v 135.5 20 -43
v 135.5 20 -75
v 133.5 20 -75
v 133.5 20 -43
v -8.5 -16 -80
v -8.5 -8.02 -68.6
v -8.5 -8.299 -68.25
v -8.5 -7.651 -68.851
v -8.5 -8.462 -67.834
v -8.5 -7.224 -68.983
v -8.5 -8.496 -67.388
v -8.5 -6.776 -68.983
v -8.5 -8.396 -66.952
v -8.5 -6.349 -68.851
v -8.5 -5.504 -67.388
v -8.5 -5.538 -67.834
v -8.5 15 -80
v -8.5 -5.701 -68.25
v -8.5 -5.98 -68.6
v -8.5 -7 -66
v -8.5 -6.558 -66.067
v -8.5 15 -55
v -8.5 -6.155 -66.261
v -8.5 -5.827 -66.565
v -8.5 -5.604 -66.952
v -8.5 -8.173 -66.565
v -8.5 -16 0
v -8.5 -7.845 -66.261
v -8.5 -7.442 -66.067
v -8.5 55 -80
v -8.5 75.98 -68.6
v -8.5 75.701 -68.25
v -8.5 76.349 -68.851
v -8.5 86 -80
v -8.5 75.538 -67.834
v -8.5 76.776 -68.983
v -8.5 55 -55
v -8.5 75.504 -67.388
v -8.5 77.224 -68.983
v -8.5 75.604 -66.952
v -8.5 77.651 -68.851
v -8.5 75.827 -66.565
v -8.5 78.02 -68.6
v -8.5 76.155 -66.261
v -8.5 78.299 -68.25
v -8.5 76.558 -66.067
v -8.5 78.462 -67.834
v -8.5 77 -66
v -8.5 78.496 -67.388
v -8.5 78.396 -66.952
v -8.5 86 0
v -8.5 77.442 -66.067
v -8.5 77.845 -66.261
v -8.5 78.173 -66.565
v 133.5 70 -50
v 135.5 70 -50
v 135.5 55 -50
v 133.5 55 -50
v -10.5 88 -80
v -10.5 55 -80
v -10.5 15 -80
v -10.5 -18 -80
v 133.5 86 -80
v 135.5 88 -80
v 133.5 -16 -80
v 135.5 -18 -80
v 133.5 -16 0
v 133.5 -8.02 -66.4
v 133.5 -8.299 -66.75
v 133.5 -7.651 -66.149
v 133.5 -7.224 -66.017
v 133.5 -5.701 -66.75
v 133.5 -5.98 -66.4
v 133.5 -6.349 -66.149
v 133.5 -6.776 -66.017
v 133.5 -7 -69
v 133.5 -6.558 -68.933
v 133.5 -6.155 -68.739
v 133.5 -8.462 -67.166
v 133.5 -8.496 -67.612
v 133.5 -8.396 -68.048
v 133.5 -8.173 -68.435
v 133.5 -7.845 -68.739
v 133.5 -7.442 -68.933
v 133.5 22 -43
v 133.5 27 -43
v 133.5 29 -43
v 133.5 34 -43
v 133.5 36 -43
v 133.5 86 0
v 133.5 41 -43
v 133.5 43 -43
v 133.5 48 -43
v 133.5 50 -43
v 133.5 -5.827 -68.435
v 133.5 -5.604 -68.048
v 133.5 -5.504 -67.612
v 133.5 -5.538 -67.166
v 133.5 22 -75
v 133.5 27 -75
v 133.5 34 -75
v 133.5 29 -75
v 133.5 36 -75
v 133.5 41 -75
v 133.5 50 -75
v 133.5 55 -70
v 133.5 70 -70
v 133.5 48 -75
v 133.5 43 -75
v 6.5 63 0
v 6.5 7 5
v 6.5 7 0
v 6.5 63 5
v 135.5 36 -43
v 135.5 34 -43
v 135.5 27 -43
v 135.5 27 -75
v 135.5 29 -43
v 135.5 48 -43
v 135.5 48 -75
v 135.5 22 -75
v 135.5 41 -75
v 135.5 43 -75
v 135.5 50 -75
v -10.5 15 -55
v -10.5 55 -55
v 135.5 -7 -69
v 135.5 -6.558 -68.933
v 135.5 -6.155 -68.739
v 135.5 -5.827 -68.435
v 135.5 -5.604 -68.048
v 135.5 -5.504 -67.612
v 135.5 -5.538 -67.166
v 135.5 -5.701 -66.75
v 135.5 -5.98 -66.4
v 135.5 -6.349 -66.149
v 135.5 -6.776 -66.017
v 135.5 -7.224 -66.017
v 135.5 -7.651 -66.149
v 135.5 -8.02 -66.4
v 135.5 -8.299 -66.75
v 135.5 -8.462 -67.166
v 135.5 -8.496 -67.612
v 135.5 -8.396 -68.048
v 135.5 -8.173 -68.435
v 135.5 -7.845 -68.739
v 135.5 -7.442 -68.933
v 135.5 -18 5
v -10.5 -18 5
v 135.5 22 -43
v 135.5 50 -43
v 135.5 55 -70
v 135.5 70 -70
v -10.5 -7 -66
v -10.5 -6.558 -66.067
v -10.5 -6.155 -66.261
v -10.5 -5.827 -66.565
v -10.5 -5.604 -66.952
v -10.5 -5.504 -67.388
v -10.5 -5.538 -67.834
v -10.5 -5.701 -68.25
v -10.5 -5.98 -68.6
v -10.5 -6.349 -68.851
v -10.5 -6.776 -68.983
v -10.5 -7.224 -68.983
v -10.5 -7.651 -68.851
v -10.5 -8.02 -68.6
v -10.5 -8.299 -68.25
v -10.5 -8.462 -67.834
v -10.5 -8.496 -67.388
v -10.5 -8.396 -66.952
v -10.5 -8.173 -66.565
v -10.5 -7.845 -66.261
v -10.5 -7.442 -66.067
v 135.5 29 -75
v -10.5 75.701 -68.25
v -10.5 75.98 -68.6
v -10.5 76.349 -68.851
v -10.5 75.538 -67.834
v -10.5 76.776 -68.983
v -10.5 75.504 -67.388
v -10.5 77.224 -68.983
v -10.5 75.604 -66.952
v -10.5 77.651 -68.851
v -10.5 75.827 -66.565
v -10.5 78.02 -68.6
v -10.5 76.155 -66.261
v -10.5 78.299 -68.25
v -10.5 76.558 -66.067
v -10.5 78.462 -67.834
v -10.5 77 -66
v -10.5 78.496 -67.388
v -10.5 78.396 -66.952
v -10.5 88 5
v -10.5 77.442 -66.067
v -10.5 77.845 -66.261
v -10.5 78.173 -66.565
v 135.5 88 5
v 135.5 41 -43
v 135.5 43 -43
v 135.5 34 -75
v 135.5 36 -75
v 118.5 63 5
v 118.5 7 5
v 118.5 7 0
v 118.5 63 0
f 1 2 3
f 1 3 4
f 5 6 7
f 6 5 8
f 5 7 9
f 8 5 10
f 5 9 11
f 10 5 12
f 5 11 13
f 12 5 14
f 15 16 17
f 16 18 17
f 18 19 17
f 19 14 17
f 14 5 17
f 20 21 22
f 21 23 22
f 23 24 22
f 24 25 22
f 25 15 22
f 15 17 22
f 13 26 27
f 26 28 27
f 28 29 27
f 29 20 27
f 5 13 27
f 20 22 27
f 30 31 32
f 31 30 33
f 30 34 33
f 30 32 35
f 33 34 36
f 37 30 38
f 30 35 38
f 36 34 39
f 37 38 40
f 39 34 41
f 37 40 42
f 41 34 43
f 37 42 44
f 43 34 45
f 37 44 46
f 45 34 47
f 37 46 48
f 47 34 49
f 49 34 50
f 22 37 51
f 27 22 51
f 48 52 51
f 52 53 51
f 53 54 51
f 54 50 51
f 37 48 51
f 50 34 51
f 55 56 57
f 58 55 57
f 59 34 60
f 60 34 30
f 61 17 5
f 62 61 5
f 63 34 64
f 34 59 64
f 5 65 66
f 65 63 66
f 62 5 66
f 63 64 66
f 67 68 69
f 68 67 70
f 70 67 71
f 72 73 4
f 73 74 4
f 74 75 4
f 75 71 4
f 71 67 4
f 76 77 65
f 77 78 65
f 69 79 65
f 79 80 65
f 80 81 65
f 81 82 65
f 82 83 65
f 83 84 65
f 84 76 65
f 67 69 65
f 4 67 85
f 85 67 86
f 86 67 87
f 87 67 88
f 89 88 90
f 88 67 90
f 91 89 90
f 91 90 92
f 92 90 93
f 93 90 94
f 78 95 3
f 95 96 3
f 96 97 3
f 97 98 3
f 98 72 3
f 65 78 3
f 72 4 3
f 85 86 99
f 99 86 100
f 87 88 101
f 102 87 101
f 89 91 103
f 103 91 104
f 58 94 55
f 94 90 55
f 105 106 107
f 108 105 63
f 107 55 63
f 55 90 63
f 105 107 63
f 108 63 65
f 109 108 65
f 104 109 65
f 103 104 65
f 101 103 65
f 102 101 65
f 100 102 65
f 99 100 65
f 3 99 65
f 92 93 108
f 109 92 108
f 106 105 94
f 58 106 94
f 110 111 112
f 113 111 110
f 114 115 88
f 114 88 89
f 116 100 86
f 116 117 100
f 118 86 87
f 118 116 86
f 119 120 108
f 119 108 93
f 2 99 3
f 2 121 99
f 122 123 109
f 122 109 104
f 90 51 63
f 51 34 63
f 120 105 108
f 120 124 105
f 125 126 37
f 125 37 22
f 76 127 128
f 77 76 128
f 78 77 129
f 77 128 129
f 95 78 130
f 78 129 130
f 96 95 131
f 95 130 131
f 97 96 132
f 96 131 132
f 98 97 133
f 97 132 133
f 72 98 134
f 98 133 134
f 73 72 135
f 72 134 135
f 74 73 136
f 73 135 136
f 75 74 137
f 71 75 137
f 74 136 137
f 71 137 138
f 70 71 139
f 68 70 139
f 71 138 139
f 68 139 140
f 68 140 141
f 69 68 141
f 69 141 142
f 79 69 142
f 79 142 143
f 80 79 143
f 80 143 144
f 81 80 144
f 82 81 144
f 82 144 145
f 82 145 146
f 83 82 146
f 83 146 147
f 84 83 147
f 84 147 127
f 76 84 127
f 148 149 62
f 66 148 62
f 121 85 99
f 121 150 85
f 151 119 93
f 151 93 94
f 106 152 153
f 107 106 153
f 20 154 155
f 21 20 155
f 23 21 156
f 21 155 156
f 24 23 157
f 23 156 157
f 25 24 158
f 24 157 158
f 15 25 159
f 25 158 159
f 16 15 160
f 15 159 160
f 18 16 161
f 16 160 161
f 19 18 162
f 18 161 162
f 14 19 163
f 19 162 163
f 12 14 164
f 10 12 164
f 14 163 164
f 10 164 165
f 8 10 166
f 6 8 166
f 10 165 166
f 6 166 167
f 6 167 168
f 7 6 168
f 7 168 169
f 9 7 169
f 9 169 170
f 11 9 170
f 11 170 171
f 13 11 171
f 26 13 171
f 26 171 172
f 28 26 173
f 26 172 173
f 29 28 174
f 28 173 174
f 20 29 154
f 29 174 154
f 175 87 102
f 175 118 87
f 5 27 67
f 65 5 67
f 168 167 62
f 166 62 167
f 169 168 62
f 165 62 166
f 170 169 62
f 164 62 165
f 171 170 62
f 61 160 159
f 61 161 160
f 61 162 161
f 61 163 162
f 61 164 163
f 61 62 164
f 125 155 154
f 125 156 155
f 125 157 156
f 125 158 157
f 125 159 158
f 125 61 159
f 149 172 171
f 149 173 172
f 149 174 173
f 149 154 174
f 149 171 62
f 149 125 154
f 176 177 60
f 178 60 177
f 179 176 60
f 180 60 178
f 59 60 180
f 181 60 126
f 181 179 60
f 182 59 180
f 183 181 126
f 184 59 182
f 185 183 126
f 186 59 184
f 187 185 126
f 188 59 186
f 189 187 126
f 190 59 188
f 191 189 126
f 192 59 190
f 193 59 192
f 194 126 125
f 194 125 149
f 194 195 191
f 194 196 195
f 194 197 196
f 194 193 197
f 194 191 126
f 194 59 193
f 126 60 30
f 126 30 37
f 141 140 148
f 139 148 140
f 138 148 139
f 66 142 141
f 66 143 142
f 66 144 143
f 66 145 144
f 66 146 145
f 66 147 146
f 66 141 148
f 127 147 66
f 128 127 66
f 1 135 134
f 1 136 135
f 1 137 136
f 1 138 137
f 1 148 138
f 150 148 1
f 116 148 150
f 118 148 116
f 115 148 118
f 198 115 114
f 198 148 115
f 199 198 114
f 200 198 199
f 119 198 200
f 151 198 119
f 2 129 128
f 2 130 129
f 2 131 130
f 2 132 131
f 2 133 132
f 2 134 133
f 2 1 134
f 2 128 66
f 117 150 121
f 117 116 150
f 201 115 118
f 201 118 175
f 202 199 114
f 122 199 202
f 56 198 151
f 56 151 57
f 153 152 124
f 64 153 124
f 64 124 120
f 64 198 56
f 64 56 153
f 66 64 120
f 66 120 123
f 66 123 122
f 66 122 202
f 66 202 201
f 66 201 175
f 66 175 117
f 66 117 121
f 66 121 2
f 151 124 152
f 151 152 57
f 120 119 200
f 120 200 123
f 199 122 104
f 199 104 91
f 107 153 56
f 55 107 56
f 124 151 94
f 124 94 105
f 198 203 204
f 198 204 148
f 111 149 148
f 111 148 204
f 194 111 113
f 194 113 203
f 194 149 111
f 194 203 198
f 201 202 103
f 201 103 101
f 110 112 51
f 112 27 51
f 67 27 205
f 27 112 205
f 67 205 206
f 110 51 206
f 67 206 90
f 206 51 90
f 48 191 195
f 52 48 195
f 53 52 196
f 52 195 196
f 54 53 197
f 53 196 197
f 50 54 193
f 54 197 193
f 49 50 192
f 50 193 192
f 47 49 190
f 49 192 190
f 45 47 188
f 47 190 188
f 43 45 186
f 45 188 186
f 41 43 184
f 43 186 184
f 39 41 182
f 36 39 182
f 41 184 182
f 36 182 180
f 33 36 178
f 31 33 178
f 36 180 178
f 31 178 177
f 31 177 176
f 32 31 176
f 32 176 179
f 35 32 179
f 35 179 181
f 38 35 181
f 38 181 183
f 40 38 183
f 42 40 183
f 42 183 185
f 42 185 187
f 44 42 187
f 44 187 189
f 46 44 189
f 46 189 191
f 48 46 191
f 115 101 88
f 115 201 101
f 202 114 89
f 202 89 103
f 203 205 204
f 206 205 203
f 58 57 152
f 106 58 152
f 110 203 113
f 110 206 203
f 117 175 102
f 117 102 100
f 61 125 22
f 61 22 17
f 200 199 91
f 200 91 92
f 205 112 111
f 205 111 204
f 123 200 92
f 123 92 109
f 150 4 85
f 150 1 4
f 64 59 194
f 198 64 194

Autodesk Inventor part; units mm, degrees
ref_plane "YZ Plane" through (0, 0, 0) normal (1, 0, 0) x (0, 1, 0)
ref_plane "XZ Plane" through (0, 0, 0) normal (0, 1, 0) x (-1, 0, 0)
ref_plane "XY Plane" through (0, 0, 0) normal (0, 0, 1) x (1, 0, 0)
sketch "Sketch1" plane through (0, 0, 0) normal (0, 0, 1) x (1, 0, 0)
  line L0 (0, 0) -> (0, 70) construction
  circle A0 centre (0, 0) radius 2.5
  circle A1 centre (0, 70) radius 2.5
  line L1 (0, 0) -> (125, 0) construction
  circle A2 centre (125, 0) radius 2.5
  circle A3 centre (125, 70) radius 2.5
  line L2 (-8.5, -16) -> (133.5, -16)
  line L3 (133.5, -16) -> (133.5, 86)
  line L4 (133.5, 86) -> (-8.5, 86)
  line L5 (-8.5, 86) -> (-8.5, -16)
  point P0 (62.5, 0)
  point P1 (62.5, -16)
  point P2 (0, 35)
  point P3 (-8.5, 35)
  dimension "d0" = 70
  dimension "d1" = 5
  dimension "d2" = 5
  dimension "d3" = 5
  dimension "d4" = 5
  dimension "d5" = 125
  dimension "d6" = 142
  dimension "d7" = 102
extrude "Extrusion1" add sketch "Sketch1" along normal blind 5
sketch "Sketch2" plane through (0, 0, 5) normal (0, 0, 1) x (1, 0, 0)
  line L0 (6.5, 60) -> (118.5, 60)
  line L1 (118.5, 60) -> (118.5, 10)
  line L2 (118.5, 10) -> (6.5, 10)
  line L3 (6.5, 10) -> (6.5, 60)
  line L4 (-8.5, 86) -> (-8.5, -16) projected
  line L5 (133.5, 86) -> (-8.5, 86) projected
  point P0 (0, 0)
  point P1 (62.5, 60)
  point P2 (62.5, 86)
  point P3 (6.5, 35)
  point P4 (-8.5, 35)
  dimension "d10" = 15
  dimension "d11" = 50
extrude "Extrusion2" cut sketch "Sketch2" against normal through all
sketch "Sketch3" plane through (-8.5, 86, 0) normal (0, 1, 0) x (1, 0, 0)
  line L0 (142, 0) -> (142, -5) projected
  line L1 (142, -5) -> (0, -5)
  line L2 (0, -5) -> (0, 80)
  line L3 (0, 80) -> (142, 80)
  line L4 (142, 80) -> (142, -5)
  point P0 (8.5, 0)
  dimension "d17" = 85
extrude "Extrusion3" add sketch "Sketch3" along normal blind 2
sketch "Sketch4" plane through (-8.5, -16, 0) normal (0, -1, 0) x (1, 0, 0)
  line L0 (142, 0) -> (0, 0) projected
  line L1 (0, 0) -> (0, -80) projected
  line L2 (0, -80) -> (142, -80) projected
  line L3 (142, -80) -> (142, 0) projected
  line L4 (0, 0) -> (142, 0) projected
  line L5 (142, 0) -> (142, 5) projected
  line L6 (0, 5) -> (142, 5) projected
  line L7 (0, 0) -> (0, 5) projected
  point P0 (8.5, 0)
extrude "Extrusion4" add sketch "Sketch4" along normal blind 2
sketch "Sketch5" plane through (-8.5, 86, -80) normal (-1, 0, 0) x (0, 0, 1)
  line L0 (85, -104) -> (85, 2) projected
  line L1 (0, -102) -> (0, -104) projected
  line L2 (85, 2) -> (0, 2)
  line L3 (0, 2) -> (0, -104)
  line L4 (0, -104) -> (85, -104)
  line L5 (85, -104) -> (85, 2)
  point P0 (80, -86)
extrude "Extrusion5" add sketch "Sketch5" along normal blind 2
sketch "Sketch6" plane through (133.5, 86, 0) normal (1, 0, 0) x (0, 0, -1)
  line L0 (-5, -104) -> (-5, 2) projected
  line L1 (-5, -104) -> (80, -104)
  line L2 (80, -104) -> (80, 2)
  line L3 (80, 2) -> (-5, 2)
  line L4 (-5, 2) -> (-5, -104)
  point P0 (0, -86)
extrude "Extrusion6" add sketch "Sketch6" along normal blind 2
sketch "Sketch7" plane through (0, 0, 5) normal (0, 0, 1) x (1, 0, 0)
  line L0 (118.5, 10) -> (6.5, 10) construction
  line L1 (6.5, 60) -> (118.5, 60) construction
  line L2 (6.5, 10) -> (6.5, 60) construction
  line L3 (118.5, 60) -> (118.5, 10) construction
  line L4 (6.5, 60) -> (61.5, 60)
  line L5 (61.5, 60) -> (61.5, 50)
  line L6 (61.5, 50) -> (6.5, 50)
  line L7 (6.5, 50) -> (6.5, 60)
  line L8 (118.5, 10) -> (63.5, 10)
  line L9 (63.5, 10) -> (63.5, 20)
  line L10 (63.5, 20) -> (118.5, 20)
  line L11 (118.5, 20) -> (118.5, 10)
  line L12 (118.5, 10) -> (6.5, 10) projected
  line L13 (6.5, 60) -> (118.5, 60) projected
  line L14 (6.5, 10) -> (6.5, 60) projected
  point P0 (0, 0)
  point P1 (62.5, 10)
  point P2 (62.5, 60)
  point P3 (6.5, 35)
  dimension "d26" = 55
  dimension "d27" = 10
  dimension "d28" = 55
  dimension "d29" = 10
extrude "Extrusion7" add sketch "Sketch7" against normal blind 5
chamfer "Chamfer2" distance 3 angle 45 4 edges at (35, 10, 0) (90, 60, 0) (91, 20, 5) (34, 50, 5)
sketch "Sketch8" plane through (135.5, 86, 0) normal (1, 0, 0) x (0, 0, -1)
  line L0 (80, -104) -> (80, 2) projected
  line L1 (80, -102) -> (80, 0) projected
  line L2 (80, -51) -> (93.9386, -51)
  line L3 (80, -78.0836) -> (55, -78.0836)
  line L4 (55, -78.0836) -> (55, -58.0836)
  line L5 (55, -58.0836) -> (80, -58.0836)
  line L6 (80, -58.0836) -> (80, -78.0836)
  point P0 (0, -86)
  dimension "d36" = 20
  dimension "d37" = 25
  dimension "d40" = 7.0836
extrude "Extrusion8" cut sketch "Sketch8" against normal blind 10
sketch "Sketch9" plane through (-10.5, 86, -80) normal (-1, 0, 0) x (0, 0, 1)
  line L0 (0, -58.0836) -> (0, 0) projected
  line L1 (0, -31) -> (25, -31)
  line L2 (25, -31) -> (25, -71)
  line L3 (25, -71) -> (0, -71)
  line L4 (0, -71) -> (0, -31)
  line L5 (0, 2) -> (0, -104) projected
  line L6 (0, -71) -> (25, -71)
  line L7 (25, -71) -> (25, -31)
  line L8 (25, -31) -> (0, -31)
  line L9 (0, -31) -> (0, -71)
  point P0 (80, -86)
  point P1 (0, -51)
  dimension "d41" = 40
  dimension "d42" = 25
extrude "Extrusion9" cut sketch "Sketch9" against normal blind 10
sketch "Sketch10" plane through (-10.5, 86, -80) normal (-1, 0, 0) x (0, 0, 1)
  circle A0 centre (12.5, -93) radius 1.5
  circle A1 centre (12.5, -9) radius 1.5
  line L0 (12.5, -93) -> (12.5, -9) construction
  line L1 (85, -104) -> (85, 2) projected
  line L2 (25, -71) -> (0, -71) projected
  point P0 (80, -86)
  point P1 (85, -51)
  point P2 (12.5, -51)
  point P3 (12.5, -71)
  point P4 (12.5, -71)
  dimension "d45" = 3
  dimension "d46" = 3
  dimension "d47" = 84
extrude "Extrusion10" cut sketch "Sketch10" against normal blind 10
sketch "Sketch11" plane through (0, 0, 5) normal (0, 0, 1) x (1, 0, 0)
  circle A0 centre (0, 0) radius 2.5 projected
  circle A1 centre (0, 70) radius 2.5 projected
  circle A2 centre (125, 0) radius 2.5 projected
  circle A3 centre (125, 70) radius 2.5 projected
extrude "Extrusion11" add sketch "Sketch11" against normal blind 5
sketch "Sketch12" plane through (0, 0, 5) normal (0, 0, 1) x (1, 0, 0)
  line L0 (118.5, 20) -> (118.5, 63) projected
  line L1 (6.5, 7) -> (118.5, 7)
  line L2 (118.5, 7) -> (118.5, 63)
  line L3 (118.5, 63) -> (6.5, 63)
  line L4 (6.5, 63) -> (6.5, 7)
  point P0 (0, 0)
extrude "Extrusion12" cut sketch "Sketch12" along normal through all both and the other way through all
sketch "Sketch13" plane through (135.5, 86, 0) normal (1, 0, 0) x (0, 0, -1)
  line L0 (55, -58.0836) -> (80, -58.0836) projected
  line L1 (55, -78.0836) -> (55, -58.0836) projected
  line L2 (80, -78.0836) -> (55, -78.0836) projected
  line L3 (80, -58.0836) -> (80, -78.0836)
  line L4 (80, -71) -> (80, -102) projected
  point P0 (0, -86)
extrude "Extrusion13" add sketch "Sketch13" against normal blind 2
sketch "Sketch15" plane through (135.5, 86, 0) normal (1, 0, 0) x (0, 0, -1)
  line L0 (50, -31) -> (70, -31)
  line L1 (70, -31) -> (70, -16)
  line L2 (70, -16) -> (50, -16)
  line L3 (50, -16) -> (50, -31)
  line L4 (80, -104) -> (80, 2) projected
  line L5 (80, 2) -> (-5, 2) projected
  point P0 (0, -86)
  dimension "d64" = 20
  dimension "d65" = 15
  dimension "d66" = 10
  dimension "d67" = 18
extrude "Extrusion15" cut sketch "Sketch15" against normal blind 10
sketch "Sketch16" plane through (135.5, 86, 0) normal (1, 0, 0) x (0, 0, -1)
  line L0 (70, -31) -> (50, -31) construction
  line L1 (50, -16) -> (70, -16) construction
  line L2 (50, -31) -> (50, -16) construction
  line L3 (70, -16) -> (70, -31) construction
  line L4 (70, -31) -> (70, -16) construction
  line L5 (70, -31) -> (38, -31) construction
  line L6 (38, -31) -> (38, -71) construction
  line L7 (38, -71) -> (80, -71) construction
  line L8 (80, -71) -> (80, -31) construction
  line L9 (43, -66) -> (43, -36) construction
  line L10 (43, -36) -> (75, -36) construction
  line L11 (75, -36) -> (75, -66) construction
  line L12 (75, -66) -> (43, -66) construction
  line L13 (43, -36) -> (75, -36)
  line L14 (75, -36) -> (75, -38)
  line L15 (75, -38) -> (43, -38)
  line L16 (43, -38) -> (43, -36)
  line L17 (75, -66) -> (43, -66)
  line L18 (43, -66) -> (43, -64)
  line L19 (43, -64) -> (75, -64)
  line L20 (75, -64) -> (75, -66)
  line L21 (75, -45) -> (43, -45)
  line L22 (43, -43) -> (75, -43) construction
  line L23 (43, -43) -> (75, -43)
  line L24 (75, -43) -> (75, -45)
  line L25 (43, -45) -> (43, -43)
  line L26 (75, -43) -> (75, -73) construction
  line L27 (75, -52) -> (43, -52)
  line L28 (43, -50) -> (75, -50) construction
  line L29 (43, -50) -> (75, -50)
  line L30 (75, -50) -> (75, -52)
  line L31 (43, -52) -> (43, -50)
  line L32 (75, -50) -> (75, -80) construction
  line L33 (75, -59) -> (43, -59)
  line L34 (43, -57) -> (75, -57) construction
  line L35 (43, -57) -> (75, -57)
  line L36 (75, -57) -> (75, -59)
  line L37 (43, -59) -> (43, -57)
  line L38 (75, -57) -> (75, -87) construction
  line L39 (75, -66) -> (43, -66)
  line L40 (43, -64) -> (75, -64) construction
  line L41 (43, -64) -> (75, -64)
  line L42 (75, -64) -> (75, -66)
  line L43 (43, -66) -> (43, -64)
  line L44 (75, -64) -> (75, -94) construction
  line L45 (80, -104) -> (80, 2) projected
  point P0 (0, -86)
  dimension "d70" = 42
  dimension "d71" = 40
  dimension "d72" = 5
  dimension "d73" = 2
  dimension "d74" = 2
  dimension "d77" = 7
extrude "Extrusion16" cut sketch "Sketch16" against normal blind 10
sketch "Sketch17" plane through (135.5, 86, 0) normal (1, 0, 0) x (0, 0, -1)
  circle A0 centre (67.5, -93) radius 1.5 projected
  point P0 (0, -86)
extrude "Extrusion17" cut sketch "Sketch17" against normal blind 10
properties part number "GA06" material "ABS Plastic"
